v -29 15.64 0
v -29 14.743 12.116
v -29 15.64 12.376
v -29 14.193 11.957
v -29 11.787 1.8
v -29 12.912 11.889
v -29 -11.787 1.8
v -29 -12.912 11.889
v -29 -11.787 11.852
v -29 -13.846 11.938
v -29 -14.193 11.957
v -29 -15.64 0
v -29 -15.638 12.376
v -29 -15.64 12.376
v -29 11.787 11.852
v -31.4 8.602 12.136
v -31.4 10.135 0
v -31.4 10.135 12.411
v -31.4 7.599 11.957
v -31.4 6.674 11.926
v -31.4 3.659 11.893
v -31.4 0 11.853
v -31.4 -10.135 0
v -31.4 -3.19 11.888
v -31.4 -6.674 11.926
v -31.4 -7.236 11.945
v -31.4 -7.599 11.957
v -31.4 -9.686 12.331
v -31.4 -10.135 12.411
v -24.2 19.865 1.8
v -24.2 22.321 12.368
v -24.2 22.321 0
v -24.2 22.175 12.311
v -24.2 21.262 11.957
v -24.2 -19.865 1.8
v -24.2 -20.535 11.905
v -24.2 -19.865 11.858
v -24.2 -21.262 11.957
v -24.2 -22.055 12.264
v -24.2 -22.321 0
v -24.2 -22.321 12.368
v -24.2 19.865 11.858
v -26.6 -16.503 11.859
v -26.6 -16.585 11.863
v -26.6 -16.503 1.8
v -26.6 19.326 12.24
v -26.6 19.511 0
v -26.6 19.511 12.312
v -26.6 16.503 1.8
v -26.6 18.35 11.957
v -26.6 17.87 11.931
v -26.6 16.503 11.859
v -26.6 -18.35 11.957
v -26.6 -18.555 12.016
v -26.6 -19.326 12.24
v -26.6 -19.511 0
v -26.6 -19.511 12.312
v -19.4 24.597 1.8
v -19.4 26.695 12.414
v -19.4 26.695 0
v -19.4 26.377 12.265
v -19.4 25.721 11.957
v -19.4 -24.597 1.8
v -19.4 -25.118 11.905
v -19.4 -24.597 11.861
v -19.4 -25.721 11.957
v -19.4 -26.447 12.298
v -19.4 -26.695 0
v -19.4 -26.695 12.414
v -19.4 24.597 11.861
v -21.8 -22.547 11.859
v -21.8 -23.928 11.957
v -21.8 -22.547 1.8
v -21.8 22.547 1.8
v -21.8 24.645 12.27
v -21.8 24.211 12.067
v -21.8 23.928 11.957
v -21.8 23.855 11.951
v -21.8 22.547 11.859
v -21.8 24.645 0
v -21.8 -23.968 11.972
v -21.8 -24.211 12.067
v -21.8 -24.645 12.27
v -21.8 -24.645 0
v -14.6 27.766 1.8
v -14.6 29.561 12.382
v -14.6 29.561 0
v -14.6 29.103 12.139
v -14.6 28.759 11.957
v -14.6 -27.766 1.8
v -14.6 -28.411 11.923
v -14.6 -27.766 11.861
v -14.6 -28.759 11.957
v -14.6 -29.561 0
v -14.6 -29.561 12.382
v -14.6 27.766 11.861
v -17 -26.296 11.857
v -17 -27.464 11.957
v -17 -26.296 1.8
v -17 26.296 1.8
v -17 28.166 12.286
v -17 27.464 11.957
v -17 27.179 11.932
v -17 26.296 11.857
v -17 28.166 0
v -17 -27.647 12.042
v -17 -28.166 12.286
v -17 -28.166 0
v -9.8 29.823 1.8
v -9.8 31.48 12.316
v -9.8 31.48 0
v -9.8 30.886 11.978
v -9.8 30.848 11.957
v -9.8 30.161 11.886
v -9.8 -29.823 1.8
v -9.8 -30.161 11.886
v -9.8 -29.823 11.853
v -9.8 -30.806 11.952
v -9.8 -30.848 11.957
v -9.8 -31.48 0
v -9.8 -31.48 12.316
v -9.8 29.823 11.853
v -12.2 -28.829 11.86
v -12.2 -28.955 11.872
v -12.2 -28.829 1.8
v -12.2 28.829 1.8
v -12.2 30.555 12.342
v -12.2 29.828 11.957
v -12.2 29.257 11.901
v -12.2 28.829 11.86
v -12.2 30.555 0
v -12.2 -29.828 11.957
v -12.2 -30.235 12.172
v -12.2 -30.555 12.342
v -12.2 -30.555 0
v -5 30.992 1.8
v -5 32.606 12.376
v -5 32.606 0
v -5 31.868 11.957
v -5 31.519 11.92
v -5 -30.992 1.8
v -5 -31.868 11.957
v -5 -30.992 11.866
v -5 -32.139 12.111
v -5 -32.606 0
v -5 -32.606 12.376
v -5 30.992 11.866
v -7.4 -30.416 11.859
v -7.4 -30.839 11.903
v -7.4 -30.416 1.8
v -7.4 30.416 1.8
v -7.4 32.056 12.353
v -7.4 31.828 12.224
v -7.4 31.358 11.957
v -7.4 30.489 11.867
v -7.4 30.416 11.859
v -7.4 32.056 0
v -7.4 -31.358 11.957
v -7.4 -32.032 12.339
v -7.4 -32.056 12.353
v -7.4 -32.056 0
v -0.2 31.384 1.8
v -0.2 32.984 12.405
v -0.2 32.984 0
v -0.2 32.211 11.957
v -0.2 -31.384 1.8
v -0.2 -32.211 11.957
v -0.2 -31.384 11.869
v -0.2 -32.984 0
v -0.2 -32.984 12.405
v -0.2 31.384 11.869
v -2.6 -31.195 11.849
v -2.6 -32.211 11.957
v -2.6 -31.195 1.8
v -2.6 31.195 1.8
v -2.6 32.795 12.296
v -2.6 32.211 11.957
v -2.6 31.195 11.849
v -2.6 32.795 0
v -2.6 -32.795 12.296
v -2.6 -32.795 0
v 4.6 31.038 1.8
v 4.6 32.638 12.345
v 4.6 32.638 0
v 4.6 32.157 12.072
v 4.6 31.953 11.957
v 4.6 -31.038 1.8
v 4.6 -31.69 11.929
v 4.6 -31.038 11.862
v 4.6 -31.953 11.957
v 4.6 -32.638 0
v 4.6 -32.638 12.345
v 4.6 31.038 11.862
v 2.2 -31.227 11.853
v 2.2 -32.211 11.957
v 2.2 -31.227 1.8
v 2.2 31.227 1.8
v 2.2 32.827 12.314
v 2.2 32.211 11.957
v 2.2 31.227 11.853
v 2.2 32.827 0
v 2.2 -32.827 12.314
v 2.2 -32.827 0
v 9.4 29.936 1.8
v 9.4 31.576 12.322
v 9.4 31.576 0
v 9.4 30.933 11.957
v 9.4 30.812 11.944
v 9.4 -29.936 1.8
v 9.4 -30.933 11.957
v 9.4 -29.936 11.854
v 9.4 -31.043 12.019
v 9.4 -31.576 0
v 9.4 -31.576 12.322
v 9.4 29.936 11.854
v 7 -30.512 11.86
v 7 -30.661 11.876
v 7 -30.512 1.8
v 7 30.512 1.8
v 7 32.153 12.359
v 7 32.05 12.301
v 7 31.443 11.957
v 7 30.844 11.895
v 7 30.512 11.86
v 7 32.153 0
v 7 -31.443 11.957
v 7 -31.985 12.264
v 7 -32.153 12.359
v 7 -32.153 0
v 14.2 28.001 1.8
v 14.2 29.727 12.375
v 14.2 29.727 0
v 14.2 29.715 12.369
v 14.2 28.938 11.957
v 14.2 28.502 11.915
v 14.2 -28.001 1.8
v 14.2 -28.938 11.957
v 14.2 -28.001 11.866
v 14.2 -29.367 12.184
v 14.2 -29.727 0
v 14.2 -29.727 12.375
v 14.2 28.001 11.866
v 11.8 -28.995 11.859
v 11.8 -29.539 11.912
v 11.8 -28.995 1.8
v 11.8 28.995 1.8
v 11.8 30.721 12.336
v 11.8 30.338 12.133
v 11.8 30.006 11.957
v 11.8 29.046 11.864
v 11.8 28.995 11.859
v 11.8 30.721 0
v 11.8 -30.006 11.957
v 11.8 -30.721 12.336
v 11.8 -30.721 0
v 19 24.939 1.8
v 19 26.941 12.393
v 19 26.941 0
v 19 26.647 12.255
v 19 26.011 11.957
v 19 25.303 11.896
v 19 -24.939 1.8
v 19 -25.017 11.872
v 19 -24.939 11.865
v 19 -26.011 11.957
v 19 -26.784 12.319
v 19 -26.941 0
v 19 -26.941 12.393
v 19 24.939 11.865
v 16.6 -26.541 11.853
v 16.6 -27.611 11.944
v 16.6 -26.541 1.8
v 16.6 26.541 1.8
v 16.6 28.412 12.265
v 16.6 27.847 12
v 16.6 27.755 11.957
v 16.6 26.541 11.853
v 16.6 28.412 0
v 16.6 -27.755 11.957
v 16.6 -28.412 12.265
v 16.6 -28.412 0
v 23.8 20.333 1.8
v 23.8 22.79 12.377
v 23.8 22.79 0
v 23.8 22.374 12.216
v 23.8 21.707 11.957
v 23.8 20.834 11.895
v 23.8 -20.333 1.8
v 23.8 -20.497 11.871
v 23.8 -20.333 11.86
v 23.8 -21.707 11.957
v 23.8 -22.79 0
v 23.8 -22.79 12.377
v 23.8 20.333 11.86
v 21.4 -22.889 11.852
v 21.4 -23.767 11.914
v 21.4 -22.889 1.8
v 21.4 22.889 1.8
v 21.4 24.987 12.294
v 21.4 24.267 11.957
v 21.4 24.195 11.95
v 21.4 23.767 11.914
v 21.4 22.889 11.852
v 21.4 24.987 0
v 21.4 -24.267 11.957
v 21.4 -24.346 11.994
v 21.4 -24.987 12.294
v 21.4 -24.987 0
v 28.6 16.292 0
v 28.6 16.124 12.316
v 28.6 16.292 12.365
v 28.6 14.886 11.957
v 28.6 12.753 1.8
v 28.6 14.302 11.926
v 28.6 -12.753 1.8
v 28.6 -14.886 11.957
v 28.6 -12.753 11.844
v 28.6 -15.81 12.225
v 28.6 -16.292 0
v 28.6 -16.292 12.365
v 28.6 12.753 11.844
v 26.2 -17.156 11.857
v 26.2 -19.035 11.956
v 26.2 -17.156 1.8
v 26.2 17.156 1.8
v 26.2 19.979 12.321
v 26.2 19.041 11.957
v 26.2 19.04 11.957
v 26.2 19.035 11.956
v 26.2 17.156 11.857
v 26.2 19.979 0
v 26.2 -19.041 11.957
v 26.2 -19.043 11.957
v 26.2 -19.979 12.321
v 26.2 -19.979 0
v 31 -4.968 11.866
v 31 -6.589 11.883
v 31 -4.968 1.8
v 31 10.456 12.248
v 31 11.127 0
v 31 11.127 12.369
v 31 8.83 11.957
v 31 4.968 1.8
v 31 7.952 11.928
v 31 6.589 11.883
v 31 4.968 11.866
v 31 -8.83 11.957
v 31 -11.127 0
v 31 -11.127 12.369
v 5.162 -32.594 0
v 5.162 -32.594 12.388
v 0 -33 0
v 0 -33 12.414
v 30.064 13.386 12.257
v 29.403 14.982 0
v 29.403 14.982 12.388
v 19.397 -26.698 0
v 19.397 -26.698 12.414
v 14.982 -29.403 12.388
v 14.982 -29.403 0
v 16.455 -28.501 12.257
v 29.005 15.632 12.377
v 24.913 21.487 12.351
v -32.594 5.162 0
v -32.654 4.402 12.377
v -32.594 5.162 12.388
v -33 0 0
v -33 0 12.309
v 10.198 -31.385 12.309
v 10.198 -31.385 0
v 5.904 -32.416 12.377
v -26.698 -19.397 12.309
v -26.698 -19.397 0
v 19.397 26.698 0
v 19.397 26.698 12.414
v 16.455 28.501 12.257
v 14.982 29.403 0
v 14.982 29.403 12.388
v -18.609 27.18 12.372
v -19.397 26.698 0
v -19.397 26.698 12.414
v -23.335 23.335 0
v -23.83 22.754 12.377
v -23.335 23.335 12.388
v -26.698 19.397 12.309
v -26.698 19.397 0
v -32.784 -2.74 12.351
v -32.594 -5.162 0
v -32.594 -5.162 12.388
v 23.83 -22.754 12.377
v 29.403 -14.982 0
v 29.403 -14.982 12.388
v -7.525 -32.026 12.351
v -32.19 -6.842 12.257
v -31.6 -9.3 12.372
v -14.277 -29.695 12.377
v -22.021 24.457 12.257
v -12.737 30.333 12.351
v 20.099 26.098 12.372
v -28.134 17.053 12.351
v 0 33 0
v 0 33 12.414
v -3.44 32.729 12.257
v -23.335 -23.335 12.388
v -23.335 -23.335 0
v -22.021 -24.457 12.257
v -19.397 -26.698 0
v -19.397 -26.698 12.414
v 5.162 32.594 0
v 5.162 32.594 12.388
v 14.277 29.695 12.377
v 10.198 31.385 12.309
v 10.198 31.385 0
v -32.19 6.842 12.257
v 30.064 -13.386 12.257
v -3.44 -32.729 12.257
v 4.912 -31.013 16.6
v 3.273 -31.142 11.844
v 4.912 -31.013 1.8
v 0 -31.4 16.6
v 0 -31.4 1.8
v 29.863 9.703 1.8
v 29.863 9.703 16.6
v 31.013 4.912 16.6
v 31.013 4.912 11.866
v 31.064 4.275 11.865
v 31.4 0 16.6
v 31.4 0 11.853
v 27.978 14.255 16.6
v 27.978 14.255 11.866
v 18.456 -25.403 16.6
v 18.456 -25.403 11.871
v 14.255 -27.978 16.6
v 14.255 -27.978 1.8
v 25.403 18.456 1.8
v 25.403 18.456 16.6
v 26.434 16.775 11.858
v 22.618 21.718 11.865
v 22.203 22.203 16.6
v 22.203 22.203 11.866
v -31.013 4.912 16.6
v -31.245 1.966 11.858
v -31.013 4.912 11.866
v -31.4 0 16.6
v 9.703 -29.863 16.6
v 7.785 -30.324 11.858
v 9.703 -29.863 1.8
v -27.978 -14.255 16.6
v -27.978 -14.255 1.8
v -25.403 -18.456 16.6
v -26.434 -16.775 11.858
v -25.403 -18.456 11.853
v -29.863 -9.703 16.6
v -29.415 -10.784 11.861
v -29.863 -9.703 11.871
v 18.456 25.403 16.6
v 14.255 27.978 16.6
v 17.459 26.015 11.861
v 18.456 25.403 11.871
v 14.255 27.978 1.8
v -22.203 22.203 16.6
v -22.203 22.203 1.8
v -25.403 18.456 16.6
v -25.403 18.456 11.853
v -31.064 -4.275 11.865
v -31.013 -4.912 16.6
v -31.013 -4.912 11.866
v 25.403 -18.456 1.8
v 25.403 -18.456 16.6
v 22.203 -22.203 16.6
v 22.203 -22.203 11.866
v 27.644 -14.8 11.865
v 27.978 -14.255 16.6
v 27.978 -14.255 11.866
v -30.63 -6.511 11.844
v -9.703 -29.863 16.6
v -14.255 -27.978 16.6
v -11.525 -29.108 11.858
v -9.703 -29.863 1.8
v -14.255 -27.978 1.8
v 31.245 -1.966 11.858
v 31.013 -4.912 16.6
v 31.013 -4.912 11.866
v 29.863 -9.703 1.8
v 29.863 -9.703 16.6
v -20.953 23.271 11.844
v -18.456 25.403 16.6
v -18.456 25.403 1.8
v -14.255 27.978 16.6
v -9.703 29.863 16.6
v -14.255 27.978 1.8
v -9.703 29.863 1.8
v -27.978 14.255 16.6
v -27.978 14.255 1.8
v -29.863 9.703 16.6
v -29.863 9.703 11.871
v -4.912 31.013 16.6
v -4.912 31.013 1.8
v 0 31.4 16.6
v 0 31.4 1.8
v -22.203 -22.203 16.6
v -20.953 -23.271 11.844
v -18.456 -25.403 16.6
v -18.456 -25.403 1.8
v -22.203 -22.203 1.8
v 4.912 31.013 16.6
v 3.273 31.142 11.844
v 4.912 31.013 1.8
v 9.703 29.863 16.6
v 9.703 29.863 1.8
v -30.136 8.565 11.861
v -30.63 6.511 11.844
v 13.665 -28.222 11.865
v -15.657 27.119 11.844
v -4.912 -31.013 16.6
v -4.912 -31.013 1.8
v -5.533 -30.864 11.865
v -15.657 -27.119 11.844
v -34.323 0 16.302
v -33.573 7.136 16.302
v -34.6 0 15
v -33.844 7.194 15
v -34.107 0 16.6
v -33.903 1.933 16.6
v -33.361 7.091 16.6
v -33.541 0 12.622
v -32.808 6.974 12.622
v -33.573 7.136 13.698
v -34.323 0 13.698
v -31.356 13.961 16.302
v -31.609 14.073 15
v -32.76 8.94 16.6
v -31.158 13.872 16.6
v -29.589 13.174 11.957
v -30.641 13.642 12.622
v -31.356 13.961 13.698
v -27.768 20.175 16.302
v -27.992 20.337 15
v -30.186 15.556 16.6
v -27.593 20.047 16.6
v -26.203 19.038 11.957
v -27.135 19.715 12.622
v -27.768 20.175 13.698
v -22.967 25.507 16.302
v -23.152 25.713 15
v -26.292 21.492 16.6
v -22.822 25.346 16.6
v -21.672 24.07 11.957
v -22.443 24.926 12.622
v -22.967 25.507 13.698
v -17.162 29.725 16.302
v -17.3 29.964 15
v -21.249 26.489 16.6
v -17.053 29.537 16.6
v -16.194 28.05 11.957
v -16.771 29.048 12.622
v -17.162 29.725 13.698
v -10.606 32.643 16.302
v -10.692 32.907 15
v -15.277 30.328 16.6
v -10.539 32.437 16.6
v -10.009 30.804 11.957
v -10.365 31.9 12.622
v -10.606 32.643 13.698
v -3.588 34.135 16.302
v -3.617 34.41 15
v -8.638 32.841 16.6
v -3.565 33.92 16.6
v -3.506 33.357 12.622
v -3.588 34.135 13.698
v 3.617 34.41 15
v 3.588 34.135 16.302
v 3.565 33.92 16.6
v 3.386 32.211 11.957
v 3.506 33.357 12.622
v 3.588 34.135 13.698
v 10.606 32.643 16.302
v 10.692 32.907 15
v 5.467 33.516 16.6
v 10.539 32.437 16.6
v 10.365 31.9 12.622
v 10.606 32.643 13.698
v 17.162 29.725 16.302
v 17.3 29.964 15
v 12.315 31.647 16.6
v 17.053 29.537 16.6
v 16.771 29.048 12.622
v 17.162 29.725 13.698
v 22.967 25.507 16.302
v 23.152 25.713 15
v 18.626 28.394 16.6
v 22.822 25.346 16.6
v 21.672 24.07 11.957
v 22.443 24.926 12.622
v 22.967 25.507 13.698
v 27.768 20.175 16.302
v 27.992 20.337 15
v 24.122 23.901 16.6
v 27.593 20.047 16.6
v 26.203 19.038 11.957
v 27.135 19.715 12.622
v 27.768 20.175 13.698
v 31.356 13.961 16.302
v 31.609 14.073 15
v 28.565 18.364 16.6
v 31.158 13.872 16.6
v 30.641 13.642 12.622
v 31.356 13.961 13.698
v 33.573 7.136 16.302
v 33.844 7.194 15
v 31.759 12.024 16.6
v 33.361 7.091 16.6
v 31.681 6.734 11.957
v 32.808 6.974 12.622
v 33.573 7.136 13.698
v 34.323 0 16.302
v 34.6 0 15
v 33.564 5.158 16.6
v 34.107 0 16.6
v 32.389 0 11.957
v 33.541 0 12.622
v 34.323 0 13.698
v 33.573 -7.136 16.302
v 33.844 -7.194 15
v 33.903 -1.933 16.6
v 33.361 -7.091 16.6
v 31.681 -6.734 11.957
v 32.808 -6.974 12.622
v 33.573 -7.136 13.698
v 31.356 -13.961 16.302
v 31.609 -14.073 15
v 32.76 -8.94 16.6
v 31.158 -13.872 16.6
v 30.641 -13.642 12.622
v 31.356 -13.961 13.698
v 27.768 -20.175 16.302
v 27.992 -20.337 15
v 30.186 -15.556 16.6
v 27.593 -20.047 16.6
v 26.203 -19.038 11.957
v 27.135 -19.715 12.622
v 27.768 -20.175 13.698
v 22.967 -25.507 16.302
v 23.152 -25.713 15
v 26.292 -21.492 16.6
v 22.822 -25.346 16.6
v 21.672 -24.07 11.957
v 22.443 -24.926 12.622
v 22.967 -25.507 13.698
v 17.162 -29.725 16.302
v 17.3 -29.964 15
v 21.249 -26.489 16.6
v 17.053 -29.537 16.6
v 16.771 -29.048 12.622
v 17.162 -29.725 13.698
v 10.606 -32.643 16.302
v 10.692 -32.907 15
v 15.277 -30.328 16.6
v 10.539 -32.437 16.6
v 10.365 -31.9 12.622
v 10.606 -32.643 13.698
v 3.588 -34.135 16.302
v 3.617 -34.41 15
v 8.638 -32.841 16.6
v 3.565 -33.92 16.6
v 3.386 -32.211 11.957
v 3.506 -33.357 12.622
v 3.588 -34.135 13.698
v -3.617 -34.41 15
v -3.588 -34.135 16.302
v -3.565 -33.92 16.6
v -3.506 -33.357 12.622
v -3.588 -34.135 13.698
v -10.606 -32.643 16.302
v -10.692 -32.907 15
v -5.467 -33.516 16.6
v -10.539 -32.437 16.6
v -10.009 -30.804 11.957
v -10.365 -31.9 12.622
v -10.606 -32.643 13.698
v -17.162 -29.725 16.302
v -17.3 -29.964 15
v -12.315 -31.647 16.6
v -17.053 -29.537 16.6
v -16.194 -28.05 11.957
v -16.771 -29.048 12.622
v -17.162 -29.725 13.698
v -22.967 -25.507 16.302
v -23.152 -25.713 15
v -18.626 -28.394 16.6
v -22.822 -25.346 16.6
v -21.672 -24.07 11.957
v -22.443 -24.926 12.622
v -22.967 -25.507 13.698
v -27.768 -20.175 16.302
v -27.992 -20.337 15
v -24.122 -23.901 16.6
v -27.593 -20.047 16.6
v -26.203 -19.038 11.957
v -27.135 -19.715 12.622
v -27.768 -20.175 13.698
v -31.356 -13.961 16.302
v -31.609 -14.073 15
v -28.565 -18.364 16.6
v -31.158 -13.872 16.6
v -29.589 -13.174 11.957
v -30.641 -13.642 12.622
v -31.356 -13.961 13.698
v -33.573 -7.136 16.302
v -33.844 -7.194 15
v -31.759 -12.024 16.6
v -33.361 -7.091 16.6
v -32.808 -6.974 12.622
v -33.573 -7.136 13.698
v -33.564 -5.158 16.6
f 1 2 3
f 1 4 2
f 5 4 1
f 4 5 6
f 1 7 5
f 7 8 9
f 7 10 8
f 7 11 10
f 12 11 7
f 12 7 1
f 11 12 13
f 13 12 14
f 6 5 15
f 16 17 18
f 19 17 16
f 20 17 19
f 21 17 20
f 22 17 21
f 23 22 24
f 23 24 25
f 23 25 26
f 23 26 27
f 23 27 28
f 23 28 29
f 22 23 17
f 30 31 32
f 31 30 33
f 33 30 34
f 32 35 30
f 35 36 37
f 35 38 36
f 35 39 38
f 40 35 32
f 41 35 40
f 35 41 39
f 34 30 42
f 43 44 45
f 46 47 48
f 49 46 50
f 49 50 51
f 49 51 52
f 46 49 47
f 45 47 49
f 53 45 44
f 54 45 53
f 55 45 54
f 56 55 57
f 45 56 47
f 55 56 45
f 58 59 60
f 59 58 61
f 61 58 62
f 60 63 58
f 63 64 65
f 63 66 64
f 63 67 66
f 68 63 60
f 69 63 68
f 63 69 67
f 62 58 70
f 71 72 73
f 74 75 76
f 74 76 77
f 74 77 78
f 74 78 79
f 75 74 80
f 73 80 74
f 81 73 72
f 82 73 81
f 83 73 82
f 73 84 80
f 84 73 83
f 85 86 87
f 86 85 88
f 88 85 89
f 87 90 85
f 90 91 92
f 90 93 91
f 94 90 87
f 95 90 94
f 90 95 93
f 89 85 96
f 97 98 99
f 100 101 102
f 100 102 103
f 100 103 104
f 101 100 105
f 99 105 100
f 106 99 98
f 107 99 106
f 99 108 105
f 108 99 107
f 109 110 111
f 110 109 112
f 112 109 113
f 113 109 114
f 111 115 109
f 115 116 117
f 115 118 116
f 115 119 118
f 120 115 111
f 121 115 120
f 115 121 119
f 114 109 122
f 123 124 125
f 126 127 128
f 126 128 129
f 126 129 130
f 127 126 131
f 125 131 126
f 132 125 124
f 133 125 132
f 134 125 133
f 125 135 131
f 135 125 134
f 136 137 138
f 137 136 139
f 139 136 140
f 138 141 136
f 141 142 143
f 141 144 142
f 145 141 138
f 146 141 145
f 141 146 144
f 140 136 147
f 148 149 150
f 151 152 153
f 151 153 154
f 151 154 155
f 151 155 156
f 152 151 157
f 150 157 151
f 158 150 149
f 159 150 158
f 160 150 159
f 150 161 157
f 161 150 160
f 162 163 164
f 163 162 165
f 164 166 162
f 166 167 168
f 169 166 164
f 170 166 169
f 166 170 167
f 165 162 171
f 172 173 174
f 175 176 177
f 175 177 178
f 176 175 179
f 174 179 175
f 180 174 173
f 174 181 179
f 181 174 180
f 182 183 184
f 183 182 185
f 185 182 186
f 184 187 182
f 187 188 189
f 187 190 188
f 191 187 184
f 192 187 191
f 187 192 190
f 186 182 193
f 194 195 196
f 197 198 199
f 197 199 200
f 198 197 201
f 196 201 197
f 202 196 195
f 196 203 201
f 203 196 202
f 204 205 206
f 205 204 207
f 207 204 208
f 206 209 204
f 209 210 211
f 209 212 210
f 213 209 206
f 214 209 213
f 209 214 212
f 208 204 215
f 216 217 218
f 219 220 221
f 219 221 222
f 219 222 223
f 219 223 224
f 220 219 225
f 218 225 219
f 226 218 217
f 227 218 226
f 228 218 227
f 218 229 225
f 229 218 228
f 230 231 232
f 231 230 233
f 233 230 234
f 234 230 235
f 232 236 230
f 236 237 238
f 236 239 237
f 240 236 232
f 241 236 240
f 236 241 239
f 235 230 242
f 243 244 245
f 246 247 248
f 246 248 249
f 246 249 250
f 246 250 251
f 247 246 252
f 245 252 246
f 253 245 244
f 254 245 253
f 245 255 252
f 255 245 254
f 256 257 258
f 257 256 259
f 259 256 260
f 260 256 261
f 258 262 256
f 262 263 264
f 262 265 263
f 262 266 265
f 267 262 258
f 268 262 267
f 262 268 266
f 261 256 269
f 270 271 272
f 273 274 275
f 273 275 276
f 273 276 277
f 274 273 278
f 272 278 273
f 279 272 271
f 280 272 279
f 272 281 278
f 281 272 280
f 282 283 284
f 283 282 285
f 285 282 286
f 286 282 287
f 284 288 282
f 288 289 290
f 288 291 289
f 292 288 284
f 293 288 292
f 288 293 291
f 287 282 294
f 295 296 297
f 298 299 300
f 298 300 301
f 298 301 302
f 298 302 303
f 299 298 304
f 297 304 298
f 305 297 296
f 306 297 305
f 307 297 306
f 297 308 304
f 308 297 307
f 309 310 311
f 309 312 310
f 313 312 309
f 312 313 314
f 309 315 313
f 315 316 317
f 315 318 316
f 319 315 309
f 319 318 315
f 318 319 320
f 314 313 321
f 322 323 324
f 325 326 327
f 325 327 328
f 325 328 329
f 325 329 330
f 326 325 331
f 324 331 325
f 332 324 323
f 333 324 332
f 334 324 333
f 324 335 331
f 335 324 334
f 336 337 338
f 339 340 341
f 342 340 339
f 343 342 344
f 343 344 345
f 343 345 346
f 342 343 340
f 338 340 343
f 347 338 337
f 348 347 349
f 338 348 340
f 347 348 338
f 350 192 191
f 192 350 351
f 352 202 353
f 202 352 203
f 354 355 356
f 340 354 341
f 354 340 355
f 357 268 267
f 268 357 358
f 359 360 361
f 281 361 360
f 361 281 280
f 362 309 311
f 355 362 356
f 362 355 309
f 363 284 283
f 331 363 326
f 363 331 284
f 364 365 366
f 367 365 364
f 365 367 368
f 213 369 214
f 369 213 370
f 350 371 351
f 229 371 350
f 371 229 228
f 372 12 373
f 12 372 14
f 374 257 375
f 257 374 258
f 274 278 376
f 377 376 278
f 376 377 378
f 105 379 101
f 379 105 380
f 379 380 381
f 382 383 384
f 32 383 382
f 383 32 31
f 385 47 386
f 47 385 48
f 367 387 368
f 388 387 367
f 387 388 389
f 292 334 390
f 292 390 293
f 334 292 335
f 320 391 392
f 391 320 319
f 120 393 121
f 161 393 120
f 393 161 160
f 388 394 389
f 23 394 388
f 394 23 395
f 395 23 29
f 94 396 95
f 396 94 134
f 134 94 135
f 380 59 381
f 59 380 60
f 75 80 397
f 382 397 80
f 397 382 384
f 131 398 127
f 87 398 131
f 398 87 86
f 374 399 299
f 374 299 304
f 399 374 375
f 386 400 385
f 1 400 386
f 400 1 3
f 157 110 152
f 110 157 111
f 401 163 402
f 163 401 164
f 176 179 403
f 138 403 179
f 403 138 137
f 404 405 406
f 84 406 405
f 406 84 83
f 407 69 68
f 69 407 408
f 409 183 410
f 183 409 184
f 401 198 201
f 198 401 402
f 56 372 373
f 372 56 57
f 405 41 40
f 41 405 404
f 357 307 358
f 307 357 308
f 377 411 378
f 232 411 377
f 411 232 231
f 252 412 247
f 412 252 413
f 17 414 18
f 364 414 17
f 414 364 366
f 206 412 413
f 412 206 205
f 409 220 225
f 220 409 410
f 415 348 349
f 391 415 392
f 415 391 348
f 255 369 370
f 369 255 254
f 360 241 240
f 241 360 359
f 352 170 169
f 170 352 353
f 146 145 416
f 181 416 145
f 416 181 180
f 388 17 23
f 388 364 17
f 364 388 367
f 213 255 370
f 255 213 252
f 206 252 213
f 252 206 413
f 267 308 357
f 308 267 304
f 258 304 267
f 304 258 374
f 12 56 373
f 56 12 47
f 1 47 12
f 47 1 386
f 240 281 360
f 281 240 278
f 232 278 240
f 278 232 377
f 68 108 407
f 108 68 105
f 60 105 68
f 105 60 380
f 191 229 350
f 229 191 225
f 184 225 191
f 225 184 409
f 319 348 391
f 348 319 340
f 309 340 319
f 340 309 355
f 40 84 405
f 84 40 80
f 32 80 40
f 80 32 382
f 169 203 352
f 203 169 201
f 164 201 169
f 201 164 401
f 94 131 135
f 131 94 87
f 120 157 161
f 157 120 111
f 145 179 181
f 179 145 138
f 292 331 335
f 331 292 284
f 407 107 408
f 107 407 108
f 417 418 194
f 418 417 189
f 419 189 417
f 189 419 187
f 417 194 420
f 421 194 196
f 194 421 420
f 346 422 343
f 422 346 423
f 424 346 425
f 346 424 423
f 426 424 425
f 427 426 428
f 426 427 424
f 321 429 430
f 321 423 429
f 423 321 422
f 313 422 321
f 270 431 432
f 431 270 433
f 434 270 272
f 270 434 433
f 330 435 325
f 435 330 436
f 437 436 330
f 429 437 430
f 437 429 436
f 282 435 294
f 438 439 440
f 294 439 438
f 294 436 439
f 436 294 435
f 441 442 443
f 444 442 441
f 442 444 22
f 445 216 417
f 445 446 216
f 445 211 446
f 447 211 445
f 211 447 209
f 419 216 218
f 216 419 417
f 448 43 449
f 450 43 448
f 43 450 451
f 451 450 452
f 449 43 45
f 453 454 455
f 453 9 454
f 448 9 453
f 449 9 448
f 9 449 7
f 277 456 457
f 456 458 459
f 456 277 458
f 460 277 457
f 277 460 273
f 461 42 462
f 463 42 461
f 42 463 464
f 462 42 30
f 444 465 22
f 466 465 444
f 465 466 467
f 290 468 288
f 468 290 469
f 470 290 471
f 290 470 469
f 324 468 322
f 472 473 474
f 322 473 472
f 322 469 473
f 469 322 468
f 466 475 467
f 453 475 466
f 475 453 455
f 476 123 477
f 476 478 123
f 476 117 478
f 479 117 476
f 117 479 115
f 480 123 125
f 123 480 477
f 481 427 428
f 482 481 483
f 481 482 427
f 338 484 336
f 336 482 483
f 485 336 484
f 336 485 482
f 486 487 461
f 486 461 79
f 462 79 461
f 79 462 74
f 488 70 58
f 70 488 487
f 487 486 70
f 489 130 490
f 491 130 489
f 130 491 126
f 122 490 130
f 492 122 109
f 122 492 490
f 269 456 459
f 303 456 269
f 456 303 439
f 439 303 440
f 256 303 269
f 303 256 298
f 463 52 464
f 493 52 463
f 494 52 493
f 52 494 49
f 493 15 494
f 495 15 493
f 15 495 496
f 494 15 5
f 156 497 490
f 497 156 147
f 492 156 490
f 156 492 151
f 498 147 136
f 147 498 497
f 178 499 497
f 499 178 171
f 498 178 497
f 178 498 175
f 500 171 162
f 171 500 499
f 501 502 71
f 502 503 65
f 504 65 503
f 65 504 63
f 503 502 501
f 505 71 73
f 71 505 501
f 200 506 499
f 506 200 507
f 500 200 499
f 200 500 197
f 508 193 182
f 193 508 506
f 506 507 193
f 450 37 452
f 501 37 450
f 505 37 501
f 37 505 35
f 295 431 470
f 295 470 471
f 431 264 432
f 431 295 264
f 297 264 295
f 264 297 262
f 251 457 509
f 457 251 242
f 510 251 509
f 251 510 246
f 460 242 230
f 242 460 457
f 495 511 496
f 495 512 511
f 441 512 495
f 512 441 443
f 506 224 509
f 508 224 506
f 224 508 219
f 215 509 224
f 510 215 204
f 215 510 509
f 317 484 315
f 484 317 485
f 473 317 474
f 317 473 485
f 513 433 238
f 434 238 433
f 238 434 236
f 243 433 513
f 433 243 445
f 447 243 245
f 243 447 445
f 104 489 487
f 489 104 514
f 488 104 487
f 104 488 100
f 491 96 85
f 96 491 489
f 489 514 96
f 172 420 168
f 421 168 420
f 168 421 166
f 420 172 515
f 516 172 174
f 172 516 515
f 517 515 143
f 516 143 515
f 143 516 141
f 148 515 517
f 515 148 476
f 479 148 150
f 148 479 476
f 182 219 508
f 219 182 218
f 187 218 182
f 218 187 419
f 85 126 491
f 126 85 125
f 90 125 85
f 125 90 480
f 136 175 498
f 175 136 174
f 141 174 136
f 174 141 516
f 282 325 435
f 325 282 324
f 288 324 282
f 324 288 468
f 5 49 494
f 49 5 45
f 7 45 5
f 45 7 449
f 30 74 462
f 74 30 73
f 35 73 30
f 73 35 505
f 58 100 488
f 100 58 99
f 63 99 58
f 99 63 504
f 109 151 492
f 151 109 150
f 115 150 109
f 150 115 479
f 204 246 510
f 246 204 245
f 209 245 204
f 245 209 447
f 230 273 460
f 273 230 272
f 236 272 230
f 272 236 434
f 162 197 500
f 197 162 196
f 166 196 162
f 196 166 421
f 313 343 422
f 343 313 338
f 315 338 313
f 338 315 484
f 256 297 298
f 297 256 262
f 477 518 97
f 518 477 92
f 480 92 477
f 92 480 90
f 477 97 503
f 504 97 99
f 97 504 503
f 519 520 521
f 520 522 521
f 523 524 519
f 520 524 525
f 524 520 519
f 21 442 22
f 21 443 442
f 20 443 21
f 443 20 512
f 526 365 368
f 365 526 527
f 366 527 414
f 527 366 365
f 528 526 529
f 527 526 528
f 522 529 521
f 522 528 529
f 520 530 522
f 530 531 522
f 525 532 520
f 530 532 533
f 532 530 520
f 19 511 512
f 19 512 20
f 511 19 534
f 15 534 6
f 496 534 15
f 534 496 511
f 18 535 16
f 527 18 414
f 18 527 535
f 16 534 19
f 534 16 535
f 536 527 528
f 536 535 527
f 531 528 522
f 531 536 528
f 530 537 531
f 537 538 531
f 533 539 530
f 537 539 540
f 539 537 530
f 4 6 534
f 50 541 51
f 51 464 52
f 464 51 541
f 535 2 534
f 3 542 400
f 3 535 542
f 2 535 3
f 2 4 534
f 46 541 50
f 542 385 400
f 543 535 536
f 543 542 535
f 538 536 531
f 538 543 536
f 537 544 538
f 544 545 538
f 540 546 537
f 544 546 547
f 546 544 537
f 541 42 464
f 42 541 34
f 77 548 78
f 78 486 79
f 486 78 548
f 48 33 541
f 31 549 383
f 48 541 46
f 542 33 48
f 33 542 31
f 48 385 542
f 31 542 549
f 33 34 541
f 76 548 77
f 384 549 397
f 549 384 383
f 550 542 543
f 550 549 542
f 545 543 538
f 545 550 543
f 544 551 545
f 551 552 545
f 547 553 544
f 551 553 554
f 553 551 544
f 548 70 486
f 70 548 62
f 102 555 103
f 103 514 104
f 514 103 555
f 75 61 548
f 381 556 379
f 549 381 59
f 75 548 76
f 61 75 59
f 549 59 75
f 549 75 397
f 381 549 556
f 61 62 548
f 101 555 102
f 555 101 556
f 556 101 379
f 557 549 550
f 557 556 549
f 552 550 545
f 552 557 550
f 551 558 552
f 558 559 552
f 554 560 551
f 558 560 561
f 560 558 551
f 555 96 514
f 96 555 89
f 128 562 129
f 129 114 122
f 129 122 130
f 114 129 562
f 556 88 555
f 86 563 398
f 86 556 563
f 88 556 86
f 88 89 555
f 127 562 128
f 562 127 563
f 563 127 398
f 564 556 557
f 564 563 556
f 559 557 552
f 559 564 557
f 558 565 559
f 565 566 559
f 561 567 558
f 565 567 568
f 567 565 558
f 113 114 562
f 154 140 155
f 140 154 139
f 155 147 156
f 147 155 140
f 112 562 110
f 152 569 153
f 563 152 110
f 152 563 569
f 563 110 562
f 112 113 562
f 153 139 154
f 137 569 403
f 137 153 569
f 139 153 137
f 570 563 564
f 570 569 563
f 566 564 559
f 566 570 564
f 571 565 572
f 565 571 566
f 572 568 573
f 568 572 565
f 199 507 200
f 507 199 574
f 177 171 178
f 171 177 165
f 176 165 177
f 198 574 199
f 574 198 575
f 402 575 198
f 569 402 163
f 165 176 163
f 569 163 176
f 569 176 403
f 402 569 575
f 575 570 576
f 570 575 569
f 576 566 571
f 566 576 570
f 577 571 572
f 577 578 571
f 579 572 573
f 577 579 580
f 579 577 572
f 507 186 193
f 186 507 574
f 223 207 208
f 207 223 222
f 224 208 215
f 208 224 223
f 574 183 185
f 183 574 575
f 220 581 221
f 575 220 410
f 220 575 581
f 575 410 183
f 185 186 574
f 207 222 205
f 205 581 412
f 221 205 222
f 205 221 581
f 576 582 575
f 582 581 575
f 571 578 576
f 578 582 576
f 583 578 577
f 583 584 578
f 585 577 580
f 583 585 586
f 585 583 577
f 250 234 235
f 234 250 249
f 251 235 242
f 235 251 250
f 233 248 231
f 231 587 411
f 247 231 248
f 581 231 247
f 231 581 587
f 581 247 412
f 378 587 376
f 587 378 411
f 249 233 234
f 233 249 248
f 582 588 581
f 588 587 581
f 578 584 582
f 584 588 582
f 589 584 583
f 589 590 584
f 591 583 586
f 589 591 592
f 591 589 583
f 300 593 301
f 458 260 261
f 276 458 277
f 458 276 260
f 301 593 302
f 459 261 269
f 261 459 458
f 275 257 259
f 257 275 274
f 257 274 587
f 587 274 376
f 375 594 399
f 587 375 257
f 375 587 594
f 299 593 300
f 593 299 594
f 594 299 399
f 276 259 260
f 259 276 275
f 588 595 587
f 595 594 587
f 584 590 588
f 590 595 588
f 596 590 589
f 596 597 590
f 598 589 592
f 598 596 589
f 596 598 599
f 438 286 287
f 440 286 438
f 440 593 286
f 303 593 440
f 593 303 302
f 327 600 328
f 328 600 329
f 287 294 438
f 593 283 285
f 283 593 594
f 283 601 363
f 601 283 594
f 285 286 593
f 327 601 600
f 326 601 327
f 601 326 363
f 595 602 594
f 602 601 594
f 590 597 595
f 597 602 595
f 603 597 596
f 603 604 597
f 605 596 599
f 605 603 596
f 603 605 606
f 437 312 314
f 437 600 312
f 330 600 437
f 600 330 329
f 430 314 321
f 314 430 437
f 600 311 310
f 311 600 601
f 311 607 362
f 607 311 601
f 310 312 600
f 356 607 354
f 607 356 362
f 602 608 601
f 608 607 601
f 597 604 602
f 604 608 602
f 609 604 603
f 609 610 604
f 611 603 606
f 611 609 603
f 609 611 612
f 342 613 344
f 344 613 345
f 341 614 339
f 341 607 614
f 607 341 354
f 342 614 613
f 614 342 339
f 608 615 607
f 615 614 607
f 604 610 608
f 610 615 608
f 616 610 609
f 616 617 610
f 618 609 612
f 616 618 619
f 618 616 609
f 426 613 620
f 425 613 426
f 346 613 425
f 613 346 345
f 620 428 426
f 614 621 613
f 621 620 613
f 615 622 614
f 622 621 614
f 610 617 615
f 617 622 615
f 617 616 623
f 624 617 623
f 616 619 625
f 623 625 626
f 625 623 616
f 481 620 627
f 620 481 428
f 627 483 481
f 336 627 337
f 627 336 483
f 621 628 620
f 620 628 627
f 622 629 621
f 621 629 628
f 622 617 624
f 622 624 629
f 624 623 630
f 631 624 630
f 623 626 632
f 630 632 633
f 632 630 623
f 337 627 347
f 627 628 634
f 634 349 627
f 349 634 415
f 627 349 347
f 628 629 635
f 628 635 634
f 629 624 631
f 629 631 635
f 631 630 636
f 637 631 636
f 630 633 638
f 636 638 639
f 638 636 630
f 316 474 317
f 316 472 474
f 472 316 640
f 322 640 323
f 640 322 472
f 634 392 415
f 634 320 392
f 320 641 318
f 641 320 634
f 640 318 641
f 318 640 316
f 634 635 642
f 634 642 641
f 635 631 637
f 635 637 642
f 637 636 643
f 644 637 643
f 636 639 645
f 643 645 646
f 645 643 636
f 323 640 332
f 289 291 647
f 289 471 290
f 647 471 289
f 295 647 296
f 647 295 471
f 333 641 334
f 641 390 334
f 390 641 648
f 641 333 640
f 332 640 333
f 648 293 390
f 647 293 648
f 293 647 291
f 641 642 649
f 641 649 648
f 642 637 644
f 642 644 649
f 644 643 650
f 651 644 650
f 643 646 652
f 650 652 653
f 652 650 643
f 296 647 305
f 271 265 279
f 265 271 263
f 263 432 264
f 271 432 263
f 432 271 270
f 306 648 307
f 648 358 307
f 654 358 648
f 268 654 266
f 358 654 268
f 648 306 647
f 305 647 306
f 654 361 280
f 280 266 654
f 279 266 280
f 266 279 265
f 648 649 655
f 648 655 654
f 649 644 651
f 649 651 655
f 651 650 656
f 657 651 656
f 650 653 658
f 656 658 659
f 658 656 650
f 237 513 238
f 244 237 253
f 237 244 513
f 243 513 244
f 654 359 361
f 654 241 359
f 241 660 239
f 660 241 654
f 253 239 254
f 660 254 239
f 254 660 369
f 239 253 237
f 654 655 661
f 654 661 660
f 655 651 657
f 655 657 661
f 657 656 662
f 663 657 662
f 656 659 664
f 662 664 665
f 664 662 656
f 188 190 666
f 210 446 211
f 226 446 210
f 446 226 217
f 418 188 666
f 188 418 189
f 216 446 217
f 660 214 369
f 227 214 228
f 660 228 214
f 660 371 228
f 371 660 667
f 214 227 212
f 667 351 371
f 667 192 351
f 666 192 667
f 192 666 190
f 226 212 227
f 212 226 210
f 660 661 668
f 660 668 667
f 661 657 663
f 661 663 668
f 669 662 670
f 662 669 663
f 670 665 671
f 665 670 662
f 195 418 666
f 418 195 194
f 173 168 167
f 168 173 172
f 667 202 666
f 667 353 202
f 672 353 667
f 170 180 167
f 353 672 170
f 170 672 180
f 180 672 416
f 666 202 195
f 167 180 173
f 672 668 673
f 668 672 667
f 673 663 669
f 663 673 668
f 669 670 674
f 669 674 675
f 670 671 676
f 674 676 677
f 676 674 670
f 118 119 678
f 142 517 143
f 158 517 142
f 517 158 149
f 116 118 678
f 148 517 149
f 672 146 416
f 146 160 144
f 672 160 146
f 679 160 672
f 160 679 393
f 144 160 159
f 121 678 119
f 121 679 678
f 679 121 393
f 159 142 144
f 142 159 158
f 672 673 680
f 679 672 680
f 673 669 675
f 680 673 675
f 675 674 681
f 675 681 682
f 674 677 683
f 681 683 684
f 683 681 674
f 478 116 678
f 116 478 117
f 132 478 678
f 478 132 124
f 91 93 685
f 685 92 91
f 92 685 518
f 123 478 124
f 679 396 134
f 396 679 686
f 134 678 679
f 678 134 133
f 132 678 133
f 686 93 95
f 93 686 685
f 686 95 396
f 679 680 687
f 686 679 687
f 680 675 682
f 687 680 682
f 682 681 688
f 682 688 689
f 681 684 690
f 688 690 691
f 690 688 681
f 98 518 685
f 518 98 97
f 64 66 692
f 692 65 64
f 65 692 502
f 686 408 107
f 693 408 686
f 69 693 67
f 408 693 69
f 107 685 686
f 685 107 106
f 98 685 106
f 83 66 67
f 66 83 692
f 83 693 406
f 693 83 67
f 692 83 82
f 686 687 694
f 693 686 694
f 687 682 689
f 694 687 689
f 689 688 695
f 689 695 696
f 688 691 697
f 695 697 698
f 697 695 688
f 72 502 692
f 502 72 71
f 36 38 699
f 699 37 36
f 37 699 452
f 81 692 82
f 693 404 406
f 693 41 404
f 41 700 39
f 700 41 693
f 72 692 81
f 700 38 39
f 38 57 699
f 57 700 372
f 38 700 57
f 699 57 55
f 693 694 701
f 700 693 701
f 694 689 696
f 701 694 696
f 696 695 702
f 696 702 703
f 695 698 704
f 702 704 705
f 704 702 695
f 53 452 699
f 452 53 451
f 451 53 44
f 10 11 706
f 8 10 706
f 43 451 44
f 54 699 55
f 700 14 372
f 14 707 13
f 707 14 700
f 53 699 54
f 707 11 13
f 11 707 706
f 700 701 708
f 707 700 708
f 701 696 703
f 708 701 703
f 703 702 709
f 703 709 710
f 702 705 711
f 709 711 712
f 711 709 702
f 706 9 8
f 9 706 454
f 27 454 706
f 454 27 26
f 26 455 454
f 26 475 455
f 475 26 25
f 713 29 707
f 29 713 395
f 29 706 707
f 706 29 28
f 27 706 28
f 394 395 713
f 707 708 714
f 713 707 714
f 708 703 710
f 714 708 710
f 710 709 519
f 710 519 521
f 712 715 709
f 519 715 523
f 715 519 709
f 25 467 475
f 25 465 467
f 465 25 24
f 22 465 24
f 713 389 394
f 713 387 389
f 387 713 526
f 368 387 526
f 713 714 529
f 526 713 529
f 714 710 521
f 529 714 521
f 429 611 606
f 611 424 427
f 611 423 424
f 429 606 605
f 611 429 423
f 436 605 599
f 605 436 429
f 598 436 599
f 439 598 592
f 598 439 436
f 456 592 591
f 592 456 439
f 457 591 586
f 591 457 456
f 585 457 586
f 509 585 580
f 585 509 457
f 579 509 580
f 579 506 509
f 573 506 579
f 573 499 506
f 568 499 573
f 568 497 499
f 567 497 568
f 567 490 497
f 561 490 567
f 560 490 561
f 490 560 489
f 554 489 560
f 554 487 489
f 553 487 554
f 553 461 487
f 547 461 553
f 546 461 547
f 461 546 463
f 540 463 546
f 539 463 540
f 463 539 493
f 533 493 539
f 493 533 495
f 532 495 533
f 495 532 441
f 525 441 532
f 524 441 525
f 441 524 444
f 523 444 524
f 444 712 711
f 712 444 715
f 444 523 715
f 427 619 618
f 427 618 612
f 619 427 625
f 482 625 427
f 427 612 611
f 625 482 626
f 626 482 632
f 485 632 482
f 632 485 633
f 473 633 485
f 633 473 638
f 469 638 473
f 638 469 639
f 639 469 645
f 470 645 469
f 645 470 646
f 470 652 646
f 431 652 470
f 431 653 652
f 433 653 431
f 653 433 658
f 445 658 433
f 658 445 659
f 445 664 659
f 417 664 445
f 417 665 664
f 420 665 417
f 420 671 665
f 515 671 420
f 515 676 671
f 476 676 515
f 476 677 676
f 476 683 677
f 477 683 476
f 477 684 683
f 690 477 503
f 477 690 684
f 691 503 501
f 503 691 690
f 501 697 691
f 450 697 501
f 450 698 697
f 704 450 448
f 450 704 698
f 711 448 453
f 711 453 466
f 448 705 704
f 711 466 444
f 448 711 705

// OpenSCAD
// -*- mode: SCAD ; c-file-style: "ellemtel" ; coding: utf-8 -*-
//
//Title: Can Colander/Strainer
//Author: Alex English - ProtoParadigm
//Date: 8-12-2012
//License: Creative Commons

//Note: This simple strainer is meant to be pressed into the top of an open
//food can of vegetables, etc. to strain them.  The size and other
//parameters can be changed using the values below.

can_diameter = 66;  //can inner diameter
height = 15;

slat_width = 2.4;

preview = 1; // [0:render, 1:preview]

/* [Hidden] */

// *******************************************************
// Some more values that can be changed

wall = 1.6;
p_h = 1.8;
r_can = can_diameter / 2;
ms = 0.05; // Muggeseggele

// fn for differently sized objects, for preview or rendering.
pfa = 40;
pfb = 15;
rfa = 180;
rfb = 30;
function fa() = (preview) ? pfa : rfa;
function fb() = (preview) ? pfb : rfb;

// *******************************************************
// End setup



// *******************************************************
// Generate the part

can_colander();

module can_colander()
{
   //main strainer
   difference()
   {
      cylinder(r=r_can, height, $fn=fa());
      translate([0,0,p_h])
      {
         cylinder(r=r_can - wall, height, $fn=fa());
      }
      for(x = [-r_can + wall: slat_width * 2 : r_can - wall])
      {
         translate([x, -r_can, -ms])
         {
            cube([slat_width, r_can * 2, height]);
         }
      }
   }

   // rim
   translate([0,0,height])
   {
      difference()
      {
         rotate_extrude()
         {
            translate([r_can-wall, 0, 0])
            {
               circle(r=wall*2, $fn=fb());
            }
         }
         translate([0,0,-wall*3])
         {
            cylinder(r=r_can-wall, wall*6, $fn=fa());
         }
         translate([0, 0, wall + height/2])
         {
            cube([r_can*2+4*wall, r_can*2+4*wall, height], true);
         }
      }
   }
}
